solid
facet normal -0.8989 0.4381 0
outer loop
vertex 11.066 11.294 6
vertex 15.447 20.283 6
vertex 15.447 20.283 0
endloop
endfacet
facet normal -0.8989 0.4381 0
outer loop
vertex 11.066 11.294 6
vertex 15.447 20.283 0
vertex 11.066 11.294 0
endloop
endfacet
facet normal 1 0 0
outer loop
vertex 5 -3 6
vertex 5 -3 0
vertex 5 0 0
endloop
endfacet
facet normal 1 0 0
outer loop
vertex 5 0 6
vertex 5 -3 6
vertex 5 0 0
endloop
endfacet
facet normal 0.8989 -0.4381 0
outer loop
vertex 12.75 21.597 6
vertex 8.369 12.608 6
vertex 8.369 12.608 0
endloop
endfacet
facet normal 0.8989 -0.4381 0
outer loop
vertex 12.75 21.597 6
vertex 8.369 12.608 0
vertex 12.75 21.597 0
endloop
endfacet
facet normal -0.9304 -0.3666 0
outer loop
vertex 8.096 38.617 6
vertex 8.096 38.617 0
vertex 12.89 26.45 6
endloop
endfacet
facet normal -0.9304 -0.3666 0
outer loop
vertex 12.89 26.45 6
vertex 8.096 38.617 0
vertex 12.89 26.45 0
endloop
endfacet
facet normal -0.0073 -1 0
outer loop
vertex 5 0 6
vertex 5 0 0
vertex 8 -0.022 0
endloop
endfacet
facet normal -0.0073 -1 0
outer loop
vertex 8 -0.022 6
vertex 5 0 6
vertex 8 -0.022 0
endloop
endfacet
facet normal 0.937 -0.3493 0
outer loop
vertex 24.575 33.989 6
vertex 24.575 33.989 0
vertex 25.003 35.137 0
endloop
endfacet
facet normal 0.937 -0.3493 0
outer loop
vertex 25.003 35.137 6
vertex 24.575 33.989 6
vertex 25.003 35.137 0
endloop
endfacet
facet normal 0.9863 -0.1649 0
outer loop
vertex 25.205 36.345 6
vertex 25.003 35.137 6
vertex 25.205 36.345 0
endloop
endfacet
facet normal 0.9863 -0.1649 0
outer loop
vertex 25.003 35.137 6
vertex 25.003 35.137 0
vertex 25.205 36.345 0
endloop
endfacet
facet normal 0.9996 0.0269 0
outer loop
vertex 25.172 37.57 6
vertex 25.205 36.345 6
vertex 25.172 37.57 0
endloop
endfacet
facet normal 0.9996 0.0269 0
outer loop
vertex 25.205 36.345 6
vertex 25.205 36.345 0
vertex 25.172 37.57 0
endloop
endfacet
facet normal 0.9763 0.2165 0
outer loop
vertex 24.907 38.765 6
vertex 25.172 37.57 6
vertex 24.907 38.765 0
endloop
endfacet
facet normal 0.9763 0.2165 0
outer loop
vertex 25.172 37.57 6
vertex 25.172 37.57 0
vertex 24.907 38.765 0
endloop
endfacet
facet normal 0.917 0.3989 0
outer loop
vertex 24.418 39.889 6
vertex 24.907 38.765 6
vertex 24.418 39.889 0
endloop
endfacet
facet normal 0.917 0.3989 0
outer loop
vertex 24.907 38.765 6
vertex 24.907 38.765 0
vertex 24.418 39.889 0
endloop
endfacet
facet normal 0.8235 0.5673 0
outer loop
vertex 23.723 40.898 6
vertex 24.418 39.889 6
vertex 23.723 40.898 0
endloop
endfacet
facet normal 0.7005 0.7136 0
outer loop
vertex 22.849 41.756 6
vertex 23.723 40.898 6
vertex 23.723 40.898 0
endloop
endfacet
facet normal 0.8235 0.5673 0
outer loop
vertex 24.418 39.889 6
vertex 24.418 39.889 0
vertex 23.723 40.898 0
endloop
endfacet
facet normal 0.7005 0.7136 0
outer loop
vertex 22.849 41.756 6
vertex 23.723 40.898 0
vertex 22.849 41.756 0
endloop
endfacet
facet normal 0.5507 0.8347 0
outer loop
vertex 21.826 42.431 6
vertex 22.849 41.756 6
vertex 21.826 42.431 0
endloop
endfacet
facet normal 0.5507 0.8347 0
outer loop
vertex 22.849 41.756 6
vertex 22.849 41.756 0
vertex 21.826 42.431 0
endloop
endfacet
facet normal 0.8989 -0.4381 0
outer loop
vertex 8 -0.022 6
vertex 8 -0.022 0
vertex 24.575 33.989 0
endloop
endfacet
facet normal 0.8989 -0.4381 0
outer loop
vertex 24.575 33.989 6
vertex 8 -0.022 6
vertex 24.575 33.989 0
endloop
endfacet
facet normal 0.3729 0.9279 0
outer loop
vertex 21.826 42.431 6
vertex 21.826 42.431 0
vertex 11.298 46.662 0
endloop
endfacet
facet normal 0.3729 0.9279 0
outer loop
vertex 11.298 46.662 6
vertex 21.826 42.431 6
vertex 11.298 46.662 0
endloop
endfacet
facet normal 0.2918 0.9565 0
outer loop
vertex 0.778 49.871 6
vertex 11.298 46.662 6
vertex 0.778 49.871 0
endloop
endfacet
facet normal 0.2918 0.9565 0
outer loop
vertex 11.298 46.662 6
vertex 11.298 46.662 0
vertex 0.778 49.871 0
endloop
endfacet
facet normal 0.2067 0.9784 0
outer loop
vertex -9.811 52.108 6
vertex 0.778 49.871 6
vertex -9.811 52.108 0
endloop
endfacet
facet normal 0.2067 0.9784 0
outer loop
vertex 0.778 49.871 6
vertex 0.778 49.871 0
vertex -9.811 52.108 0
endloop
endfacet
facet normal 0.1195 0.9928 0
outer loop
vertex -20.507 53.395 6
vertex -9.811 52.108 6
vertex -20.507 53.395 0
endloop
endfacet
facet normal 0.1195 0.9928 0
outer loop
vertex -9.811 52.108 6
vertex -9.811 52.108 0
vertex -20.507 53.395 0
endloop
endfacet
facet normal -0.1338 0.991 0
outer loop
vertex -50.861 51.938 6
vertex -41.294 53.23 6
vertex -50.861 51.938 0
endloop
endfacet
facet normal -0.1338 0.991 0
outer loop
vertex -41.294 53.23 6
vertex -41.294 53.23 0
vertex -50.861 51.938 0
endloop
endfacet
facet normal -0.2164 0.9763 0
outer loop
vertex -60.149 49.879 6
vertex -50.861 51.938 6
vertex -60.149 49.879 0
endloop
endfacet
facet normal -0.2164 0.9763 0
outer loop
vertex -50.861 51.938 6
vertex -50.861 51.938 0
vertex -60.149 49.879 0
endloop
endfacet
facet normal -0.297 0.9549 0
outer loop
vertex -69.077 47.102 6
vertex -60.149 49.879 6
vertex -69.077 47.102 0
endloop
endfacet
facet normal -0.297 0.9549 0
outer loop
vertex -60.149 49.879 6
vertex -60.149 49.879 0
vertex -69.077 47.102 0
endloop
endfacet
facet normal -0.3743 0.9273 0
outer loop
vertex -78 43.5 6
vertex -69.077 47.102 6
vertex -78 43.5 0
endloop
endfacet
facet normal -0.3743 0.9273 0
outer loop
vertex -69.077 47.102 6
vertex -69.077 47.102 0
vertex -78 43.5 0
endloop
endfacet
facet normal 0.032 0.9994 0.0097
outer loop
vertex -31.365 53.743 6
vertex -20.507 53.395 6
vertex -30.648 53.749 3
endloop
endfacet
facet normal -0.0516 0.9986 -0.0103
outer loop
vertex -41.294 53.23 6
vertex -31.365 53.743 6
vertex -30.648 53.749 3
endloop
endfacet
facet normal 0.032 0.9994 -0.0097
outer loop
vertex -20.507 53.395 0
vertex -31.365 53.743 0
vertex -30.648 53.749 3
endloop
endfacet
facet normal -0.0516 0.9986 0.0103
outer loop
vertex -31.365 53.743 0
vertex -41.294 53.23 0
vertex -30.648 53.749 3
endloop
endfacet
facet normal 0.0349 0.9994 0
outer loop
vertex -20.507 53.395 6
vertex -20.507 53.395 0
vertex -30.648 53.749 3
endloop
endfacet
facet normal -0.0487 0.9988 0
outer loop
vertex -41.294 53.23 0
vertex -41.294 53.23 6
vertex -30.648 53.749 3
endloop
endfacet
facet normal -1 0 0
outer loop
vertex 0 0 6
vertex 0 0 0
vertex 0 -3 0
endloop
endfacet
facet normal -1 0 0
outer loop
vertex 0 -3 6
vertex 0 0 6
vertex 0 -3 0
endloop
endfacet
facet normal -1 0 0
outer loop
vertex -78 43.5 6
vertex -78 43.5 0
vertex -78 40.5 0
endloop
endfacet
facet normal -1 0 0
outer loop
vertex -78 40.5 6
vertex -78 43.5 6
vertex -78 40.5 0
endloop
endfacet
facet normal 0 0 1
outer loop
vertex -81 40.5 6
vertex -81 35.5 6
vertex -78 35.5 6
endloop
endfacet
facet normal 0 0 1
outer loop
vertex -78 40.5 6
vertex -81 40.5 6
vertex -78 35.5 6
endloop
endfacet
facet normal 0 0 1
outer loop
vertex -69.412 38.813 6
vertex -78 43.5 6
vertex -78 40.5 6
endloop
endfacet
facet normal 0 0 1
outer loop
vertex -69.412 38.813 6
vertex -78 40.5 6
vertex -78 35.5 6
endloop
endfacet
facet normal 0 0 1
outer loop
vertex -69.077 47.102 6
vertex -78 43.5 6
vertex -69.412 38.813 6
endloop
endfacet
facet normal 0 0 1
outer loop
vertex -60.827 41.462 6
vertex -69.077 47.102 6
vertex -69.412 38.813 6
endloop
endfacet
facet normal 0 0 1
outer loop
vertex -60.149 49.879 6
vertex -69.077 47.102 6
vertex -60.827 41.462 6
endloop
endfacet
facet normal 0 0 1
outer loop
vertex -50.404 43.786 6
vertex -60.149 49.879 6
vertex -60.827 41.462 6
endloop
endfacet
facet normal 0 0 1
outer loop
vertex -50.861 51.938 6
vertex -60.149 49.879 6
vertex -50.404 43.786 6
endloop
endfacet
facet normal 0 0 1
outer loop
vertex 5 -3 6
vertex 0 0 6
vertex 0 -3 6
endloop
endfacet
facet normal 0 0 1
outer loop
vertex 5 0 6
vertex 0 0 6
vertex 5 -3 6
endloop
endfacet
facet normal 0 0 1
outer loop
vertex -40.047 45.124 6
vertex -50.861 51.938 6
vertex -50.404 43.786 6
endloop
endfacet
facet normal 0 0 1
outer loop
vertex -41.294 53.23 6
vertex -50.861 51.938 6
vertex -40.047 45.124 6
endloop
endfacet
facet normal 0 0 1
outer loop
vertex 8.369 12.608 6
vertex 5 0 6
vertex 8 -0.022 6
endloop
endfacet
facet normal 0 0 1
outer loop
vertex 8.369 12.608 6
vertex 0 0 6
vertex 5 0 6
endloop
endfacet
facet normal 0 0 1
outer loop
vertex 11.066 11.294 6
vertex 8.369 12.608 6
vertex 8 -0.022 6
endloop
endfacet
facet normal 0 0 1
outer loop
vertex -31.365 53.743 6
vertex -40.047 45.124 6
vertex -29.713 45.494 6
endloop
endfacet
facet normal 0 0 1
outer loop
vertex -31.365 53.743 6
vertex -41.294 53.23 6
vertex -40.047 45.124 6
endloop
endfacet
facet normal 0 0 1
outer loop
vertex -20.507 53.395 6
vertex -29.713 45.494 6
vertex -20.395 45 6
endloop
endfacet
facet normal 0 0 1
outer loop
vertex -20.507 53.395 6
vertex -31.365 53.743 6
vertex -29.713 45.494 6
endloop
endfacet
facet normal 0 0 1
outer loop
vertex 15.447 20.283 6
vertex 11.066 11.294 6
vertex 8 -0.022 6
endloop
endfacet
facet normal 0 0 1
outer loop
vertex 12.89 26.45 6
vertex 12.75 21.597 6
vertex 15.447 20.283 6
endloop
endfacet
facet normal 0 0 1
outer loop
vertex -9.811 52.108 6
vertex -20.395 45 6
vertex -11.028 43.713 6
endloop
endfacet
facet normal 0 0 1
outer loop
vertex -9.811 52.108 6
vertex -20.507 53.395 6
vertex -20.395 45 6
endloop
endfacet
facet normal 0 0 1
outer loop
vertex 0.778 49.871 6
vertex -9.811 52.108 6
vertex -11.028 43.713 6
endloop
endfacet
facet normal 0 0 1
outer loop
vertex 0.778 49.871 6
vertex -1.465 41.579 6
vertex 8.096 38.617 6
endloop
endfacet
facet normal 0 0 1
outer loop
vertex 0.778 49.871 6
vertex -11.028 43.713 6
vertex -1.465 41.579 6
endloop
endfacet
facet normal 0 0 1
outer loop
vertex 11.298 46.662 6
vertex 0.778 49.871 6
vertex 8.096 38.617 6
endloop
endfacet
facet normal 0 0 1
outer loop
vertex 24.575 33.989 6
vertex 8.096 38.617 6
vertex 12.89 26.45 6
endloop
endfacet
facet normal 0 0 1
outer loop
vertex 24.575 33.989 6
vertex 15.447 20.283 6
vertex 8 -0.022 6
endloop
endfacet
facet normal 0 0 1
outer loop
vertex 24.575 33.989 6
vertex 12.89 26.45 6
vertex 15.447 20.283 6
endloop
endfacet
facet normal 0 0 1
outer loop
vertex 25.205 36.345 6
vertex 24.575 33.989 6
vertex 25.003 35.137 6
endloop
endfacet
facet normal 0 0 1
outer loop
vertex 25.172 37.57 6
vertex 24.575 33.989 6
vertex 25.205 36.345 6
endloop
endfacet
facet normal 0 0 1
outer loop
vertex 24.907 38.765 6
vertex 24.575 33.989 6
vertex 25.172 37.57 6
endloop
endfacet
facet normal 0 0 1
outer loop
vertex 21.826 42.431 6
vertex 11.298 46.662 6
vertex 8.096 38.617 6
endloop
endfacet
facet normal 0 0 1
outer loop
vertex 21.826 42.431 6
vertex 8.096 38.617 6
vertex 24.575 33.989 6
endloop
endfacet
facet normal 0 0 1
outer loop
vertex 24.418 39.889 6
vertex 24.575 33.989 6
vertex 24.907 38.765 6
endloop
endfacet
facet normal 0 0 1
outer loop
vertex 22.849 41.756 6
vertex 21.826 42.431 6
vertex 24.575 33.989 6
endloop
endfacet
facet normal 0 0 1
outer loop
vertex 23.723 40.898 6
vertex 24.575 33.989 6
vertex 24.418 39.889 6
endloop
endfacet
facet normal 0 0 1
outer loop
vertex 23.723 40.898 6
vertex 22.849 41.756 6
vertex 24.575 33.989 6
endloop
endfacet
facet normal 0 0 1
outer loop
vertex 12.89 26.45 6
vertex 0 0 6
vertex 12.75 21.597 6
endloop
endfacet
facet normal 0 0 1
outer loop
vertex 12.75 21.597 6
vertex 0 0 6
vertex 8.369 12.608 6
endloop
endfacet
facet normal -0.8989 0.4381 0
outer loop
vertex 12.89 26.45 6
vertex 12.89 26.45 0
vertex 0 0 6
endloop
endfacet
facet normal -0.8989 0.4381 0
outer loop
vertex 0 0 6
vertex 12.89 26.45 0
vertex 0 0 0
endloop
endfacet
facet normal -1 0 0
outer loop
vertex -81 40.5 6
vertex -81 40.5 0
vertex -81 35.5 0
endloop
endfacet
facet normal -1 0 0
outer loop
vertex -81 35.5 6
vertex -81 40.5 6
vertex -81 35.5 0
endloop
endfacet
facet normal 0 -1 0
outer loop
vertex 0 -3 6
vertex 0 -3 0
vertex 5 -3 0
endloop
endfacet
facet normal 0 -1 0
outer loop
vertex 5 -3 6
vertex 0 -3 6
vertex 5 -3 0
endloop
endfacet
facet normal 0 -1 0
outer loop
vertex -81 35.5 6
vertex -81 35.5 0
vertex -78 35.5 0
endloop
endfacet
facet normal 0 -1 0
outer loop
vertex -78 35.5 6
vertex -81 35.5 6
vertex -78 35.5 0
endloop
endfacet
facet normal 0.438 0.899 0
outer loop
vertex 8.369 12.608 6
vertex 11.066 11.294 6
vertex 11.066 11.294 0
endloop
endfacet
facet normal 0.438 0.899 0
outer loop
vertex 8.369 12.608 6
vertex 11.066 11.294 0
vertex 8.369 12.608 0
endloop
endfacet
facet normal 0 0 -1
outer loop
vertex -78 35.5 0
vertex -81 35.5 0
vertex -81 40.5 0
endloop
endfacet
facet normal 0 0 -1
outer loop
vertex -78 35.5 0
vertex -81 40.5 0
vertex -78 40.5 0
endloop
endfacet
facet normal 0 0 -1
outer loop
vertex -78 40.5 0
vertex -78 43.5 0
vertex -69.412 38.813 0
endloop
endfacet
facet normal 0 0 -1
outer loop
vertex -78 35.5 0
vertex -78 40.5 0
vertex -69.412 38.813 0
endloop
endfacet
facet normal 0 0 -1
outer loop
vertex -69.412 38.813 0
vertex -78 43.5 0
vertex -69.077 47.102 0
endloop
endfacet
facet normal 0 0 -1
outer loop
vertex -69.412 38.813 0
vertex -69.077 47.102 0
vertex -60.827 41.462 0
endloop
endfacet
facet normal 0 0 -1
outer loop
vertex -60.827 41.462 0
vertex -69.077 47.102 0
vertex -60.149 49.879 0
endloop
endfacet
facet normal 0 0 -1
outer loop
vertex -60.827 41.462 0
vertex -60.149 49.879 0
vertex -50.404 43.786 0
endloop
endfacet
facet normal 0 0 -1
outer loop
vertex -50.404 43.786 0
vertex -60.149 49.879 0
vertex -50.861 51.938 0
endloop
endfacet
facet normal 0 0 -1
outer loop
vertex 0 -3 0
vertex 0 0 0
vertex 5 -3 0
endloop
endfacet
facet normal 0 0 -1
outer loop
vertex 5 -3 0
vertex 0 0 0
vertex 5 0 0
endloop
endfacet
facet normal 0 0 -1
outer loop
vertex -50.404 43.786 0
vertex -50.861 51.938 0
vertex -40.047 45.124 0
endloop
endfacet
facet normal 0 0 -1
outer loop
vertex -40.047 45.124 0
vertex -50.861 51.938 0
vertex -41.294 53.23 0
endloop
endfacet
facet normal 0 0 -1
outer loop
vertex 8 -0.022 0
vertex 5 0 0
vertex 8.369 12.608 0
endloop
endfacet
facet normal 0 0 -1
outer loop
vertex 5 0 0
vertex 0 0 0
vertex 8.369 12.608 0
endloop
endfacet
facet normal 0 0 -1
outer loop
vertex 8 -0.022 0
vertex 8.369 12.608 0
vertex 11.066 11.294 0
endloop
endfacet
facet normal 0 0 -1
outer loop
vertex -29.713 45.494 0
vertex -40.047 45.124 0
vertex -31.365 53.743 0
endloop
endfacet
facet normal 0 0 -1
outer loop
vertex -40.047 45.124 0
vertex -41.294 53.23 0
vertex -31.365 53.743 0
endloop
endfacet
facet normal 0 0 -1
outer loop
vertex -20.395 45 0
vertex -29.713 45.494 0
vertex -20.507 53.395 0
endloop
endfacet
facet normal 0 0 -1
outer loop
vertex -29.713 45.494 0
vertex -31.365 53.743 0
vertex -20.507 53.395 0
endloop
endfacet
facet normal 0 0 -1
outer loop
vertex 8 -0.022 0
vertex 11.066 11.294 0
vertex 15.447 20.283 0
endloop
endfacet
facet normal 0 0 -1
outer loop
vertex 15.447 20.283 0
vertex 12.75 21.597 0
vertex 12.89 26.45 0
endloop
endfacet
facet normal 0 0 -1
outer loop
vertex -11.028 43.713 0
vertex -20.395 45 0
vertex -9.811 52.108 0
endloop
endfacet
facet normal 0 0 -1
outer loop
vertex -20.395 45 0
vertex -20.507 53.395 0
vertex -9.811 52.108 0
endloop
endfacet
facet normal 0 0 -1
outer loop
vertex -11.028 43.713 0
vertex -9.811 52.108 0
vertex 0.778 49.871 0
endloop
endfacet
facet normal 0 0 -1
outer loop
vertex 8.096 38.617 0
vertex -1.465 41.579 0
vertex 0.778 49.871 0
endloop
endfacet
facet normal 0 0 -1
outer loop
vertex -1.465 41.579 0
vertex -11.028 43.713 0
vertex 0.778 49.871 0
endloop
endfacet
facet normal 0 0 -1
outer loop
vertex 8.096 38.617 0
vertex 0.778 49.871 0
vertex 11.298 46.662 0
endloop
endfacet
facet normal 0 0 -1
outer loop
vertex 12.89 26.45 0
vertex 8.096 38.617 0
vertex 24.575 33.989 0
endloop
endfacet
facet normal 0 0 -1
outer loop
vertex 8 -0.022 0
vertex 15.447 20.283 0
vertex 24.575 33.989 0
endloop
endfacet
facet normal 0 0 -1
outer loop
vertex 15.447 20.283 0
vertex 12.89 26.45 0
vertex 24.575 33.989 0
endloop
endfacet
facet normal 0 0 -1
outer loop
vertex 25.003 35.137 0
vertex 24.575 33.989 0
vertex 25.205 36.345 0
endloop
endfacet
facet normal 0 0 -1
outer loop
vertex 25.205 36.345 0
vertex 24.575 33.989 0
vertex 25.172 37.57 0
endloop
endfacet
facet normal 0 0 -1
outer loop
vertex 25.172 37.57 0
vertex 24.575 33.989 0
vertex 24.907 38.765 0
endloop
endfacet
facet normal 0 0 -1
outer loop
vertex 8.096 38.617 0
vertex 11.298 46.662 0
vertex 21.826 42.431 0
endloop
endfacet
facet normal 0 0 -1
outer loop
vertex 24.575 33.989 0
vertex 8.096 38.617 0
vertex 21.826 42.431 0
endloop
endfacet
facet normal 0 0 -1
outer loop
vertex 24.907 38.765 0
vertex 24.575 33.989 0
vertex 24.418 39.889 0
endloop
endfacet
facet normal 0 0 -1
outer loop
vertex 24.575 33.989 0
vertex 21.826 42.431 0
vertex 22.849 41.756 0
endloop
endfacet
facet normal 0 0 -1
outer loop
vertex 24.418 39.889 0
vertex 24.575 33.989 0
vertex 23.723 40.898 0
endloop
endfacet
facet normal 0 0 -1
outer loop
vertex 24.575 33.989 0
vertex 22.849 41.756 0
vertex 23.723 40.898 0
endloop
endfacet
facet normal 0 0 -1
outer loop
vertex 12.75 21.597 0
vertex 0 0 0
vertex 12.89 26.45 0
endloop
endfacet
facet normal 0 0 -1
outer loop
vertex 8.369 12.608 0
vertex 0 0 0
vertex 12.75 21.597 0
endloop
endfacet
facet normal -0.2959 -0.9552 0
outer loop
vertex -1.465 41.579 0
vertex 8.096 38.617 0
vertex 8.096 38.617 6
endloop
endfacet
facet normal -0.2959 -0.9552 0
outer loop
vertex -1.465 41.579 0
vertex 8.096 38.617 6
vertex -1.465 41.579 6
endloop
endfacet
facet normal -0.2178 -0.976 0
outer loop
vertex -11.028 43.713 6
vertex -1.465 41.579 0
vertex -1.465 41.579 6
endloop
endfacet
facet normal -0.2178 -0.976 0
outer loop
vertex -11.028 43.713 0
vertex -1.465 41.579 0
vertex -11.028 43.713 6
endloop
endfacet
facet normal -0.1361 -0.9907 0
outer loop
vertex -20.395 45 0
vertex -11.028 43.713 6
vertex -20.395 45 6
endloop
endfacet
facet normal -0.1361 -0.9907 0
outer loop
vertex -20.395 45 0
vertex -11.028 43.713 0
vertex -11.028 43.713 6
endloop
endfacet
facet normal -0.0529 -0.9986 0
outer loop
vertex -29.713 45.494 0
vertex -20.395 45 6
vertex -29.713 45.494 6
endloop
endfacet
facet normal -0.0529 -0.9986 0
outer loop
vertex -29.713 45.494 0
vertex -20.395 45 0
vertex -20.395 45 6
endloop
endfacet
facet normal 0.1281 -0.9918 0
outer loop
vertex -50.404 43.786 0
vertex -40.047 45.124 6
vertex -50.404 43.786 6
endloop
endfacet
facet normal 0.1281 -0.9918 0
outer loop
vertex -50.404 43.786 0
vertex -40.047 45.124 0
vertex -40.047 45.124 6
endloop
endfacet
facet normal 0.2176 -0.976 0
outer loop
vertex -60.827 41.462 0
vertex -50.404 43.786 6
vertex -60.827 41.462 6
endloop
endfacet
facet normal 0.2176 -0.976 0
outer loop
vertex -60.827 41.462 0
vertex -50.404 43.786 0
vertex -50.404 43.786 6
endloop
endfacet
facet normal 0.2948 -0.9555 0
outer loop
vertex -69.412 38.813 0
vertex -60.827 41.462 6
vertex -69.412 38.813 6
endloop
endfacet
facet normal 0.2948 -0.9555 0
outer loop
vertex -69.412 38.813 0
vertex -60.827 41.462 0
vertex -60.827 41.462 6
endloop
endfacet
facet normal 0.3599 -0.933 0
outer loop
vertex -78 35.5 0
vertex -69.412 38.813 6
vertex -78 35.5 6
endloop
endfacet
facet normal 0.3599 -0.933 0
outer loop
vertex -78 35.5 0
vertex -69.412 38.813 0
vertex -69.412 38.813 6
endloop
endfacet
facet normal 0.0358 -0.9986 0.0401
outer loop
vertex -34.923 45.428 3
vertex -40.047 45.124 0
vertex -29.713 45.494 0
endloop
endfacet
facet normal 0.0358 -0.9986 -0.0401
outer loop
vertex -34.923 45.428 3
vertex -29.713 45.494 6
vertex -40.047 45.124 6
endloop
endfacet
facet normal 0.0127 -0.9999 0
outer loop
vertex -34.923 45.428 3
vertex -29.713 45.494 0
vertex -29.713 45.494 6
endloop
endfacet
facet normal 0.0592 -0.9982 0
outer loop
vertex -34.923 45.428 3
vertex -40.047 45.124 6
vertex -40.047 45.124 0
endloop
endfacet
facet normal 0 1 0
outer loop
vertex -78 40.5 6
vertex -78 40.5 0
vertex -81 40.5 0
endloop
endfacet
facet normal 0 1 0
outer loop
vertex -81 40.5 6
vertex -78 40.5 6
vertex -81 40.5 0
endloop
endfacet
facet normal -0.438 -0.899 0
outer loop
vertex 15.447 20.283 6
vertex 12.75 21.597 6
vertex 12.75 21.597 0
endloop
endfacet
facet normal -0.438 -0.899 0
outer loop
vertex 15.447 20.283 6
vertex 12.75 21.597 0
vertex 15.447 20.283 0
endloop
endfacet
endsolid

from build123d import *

# Parameters (mm, degrees)
BOSS_EXTRUDE1_DEPTH = 6
CHAMFER1_DEPTH      = 6
CUT_EXTRUDE1_DEPTH  = 6


with BuildPart() as part:
    # Sketch1 → Boss-Extrude1 (new body)
    with BuildSketch(Plane.XY):
        with BuildLine():
            Line((5, -3), (5, 0))
            Line((5, 0), (7.999917137, -0.022297349))
            Line((7.999917137, -0.022297349), (24.574810766, 33.988914515))
            ThreePointArc((24.574810766, 33.988914515), (24.906699983, 38.765486885), (21.826463092, 42.431265759))
            add(Edge.make_bspline(
                [(21.826463092, 42.431265759), (4.303477857, 50.343378655), (-29.026405502, 57.018304793), (-62.241820335, 50.620507444), (-77.999999998, 43.5)],
                knots=[0.018384898, 0.018384898, 0.018384898, 0.018384898, 0.528855814, 0.991084545, 0.991084545, 0.991084545, 0.991084545], degree=3))
            Line((-77.999999998, 43.5), (-77.999999998, 40.5))
            Line((-77.999999998, 40.5), (-81, 40.5))
            Line((-81, 40.5), (-81, 35.5))
            Line((-81, 35.5), (-78, 35.5))
            add(Edge.make_bspline(
                [(17.092660216, 35.073654222), (-30.383266578, 55.711591107), (-78, 35.5)],
                knots=[0, 0, 0, 1, 1, 1], degree=2))
            Line((17.092660216, 35.073654222), (0, 0))
            Line((0, 0), (0, -3))
            Line((0, -3), (5, -3))
        make_face()
    extrude(amount=BOSS_EXTRUDE1_DEPTH)

    # Chamfer1: read off the stored shape, not the designer's step
    # Chamfer1 outline → Chamfer1 (add)
    with BuildSketch(Plane.XY):
        with BuildLine():
            Line((8.096256687, 38.617267247), (12.890218446, 26.45036284))
            Line((12.890218446, 26.45036284), (17.092660216, 35.073654222))
            add(Edge.make_bspline(
                [(17.092660216, 35.073654222), (12.595090284, 37.028762224), (8.096256687, 38.617267247)],
                knots=[0, 0, 0, 0.094733694, 0.094733694, 0.094733694], degree=2))
        make_face()
    extrude(amount=CHAMFER1_DEPTH)

    # Sketch4 → Cut-Extrude1 (cut)
    with BuildSketch(Plane.XY.offset(6)):
        Polygon((8.369117538, 12.607849604), (12.74995002, 21.597193671), (15.44675324, 20.282943927), (11.065920758, 11.293599859), align=None)
    extrude(amount=-CUT_EXTRUDE1_DEPTH, mode=Mode.SUBTRACT)


solid = part.part
